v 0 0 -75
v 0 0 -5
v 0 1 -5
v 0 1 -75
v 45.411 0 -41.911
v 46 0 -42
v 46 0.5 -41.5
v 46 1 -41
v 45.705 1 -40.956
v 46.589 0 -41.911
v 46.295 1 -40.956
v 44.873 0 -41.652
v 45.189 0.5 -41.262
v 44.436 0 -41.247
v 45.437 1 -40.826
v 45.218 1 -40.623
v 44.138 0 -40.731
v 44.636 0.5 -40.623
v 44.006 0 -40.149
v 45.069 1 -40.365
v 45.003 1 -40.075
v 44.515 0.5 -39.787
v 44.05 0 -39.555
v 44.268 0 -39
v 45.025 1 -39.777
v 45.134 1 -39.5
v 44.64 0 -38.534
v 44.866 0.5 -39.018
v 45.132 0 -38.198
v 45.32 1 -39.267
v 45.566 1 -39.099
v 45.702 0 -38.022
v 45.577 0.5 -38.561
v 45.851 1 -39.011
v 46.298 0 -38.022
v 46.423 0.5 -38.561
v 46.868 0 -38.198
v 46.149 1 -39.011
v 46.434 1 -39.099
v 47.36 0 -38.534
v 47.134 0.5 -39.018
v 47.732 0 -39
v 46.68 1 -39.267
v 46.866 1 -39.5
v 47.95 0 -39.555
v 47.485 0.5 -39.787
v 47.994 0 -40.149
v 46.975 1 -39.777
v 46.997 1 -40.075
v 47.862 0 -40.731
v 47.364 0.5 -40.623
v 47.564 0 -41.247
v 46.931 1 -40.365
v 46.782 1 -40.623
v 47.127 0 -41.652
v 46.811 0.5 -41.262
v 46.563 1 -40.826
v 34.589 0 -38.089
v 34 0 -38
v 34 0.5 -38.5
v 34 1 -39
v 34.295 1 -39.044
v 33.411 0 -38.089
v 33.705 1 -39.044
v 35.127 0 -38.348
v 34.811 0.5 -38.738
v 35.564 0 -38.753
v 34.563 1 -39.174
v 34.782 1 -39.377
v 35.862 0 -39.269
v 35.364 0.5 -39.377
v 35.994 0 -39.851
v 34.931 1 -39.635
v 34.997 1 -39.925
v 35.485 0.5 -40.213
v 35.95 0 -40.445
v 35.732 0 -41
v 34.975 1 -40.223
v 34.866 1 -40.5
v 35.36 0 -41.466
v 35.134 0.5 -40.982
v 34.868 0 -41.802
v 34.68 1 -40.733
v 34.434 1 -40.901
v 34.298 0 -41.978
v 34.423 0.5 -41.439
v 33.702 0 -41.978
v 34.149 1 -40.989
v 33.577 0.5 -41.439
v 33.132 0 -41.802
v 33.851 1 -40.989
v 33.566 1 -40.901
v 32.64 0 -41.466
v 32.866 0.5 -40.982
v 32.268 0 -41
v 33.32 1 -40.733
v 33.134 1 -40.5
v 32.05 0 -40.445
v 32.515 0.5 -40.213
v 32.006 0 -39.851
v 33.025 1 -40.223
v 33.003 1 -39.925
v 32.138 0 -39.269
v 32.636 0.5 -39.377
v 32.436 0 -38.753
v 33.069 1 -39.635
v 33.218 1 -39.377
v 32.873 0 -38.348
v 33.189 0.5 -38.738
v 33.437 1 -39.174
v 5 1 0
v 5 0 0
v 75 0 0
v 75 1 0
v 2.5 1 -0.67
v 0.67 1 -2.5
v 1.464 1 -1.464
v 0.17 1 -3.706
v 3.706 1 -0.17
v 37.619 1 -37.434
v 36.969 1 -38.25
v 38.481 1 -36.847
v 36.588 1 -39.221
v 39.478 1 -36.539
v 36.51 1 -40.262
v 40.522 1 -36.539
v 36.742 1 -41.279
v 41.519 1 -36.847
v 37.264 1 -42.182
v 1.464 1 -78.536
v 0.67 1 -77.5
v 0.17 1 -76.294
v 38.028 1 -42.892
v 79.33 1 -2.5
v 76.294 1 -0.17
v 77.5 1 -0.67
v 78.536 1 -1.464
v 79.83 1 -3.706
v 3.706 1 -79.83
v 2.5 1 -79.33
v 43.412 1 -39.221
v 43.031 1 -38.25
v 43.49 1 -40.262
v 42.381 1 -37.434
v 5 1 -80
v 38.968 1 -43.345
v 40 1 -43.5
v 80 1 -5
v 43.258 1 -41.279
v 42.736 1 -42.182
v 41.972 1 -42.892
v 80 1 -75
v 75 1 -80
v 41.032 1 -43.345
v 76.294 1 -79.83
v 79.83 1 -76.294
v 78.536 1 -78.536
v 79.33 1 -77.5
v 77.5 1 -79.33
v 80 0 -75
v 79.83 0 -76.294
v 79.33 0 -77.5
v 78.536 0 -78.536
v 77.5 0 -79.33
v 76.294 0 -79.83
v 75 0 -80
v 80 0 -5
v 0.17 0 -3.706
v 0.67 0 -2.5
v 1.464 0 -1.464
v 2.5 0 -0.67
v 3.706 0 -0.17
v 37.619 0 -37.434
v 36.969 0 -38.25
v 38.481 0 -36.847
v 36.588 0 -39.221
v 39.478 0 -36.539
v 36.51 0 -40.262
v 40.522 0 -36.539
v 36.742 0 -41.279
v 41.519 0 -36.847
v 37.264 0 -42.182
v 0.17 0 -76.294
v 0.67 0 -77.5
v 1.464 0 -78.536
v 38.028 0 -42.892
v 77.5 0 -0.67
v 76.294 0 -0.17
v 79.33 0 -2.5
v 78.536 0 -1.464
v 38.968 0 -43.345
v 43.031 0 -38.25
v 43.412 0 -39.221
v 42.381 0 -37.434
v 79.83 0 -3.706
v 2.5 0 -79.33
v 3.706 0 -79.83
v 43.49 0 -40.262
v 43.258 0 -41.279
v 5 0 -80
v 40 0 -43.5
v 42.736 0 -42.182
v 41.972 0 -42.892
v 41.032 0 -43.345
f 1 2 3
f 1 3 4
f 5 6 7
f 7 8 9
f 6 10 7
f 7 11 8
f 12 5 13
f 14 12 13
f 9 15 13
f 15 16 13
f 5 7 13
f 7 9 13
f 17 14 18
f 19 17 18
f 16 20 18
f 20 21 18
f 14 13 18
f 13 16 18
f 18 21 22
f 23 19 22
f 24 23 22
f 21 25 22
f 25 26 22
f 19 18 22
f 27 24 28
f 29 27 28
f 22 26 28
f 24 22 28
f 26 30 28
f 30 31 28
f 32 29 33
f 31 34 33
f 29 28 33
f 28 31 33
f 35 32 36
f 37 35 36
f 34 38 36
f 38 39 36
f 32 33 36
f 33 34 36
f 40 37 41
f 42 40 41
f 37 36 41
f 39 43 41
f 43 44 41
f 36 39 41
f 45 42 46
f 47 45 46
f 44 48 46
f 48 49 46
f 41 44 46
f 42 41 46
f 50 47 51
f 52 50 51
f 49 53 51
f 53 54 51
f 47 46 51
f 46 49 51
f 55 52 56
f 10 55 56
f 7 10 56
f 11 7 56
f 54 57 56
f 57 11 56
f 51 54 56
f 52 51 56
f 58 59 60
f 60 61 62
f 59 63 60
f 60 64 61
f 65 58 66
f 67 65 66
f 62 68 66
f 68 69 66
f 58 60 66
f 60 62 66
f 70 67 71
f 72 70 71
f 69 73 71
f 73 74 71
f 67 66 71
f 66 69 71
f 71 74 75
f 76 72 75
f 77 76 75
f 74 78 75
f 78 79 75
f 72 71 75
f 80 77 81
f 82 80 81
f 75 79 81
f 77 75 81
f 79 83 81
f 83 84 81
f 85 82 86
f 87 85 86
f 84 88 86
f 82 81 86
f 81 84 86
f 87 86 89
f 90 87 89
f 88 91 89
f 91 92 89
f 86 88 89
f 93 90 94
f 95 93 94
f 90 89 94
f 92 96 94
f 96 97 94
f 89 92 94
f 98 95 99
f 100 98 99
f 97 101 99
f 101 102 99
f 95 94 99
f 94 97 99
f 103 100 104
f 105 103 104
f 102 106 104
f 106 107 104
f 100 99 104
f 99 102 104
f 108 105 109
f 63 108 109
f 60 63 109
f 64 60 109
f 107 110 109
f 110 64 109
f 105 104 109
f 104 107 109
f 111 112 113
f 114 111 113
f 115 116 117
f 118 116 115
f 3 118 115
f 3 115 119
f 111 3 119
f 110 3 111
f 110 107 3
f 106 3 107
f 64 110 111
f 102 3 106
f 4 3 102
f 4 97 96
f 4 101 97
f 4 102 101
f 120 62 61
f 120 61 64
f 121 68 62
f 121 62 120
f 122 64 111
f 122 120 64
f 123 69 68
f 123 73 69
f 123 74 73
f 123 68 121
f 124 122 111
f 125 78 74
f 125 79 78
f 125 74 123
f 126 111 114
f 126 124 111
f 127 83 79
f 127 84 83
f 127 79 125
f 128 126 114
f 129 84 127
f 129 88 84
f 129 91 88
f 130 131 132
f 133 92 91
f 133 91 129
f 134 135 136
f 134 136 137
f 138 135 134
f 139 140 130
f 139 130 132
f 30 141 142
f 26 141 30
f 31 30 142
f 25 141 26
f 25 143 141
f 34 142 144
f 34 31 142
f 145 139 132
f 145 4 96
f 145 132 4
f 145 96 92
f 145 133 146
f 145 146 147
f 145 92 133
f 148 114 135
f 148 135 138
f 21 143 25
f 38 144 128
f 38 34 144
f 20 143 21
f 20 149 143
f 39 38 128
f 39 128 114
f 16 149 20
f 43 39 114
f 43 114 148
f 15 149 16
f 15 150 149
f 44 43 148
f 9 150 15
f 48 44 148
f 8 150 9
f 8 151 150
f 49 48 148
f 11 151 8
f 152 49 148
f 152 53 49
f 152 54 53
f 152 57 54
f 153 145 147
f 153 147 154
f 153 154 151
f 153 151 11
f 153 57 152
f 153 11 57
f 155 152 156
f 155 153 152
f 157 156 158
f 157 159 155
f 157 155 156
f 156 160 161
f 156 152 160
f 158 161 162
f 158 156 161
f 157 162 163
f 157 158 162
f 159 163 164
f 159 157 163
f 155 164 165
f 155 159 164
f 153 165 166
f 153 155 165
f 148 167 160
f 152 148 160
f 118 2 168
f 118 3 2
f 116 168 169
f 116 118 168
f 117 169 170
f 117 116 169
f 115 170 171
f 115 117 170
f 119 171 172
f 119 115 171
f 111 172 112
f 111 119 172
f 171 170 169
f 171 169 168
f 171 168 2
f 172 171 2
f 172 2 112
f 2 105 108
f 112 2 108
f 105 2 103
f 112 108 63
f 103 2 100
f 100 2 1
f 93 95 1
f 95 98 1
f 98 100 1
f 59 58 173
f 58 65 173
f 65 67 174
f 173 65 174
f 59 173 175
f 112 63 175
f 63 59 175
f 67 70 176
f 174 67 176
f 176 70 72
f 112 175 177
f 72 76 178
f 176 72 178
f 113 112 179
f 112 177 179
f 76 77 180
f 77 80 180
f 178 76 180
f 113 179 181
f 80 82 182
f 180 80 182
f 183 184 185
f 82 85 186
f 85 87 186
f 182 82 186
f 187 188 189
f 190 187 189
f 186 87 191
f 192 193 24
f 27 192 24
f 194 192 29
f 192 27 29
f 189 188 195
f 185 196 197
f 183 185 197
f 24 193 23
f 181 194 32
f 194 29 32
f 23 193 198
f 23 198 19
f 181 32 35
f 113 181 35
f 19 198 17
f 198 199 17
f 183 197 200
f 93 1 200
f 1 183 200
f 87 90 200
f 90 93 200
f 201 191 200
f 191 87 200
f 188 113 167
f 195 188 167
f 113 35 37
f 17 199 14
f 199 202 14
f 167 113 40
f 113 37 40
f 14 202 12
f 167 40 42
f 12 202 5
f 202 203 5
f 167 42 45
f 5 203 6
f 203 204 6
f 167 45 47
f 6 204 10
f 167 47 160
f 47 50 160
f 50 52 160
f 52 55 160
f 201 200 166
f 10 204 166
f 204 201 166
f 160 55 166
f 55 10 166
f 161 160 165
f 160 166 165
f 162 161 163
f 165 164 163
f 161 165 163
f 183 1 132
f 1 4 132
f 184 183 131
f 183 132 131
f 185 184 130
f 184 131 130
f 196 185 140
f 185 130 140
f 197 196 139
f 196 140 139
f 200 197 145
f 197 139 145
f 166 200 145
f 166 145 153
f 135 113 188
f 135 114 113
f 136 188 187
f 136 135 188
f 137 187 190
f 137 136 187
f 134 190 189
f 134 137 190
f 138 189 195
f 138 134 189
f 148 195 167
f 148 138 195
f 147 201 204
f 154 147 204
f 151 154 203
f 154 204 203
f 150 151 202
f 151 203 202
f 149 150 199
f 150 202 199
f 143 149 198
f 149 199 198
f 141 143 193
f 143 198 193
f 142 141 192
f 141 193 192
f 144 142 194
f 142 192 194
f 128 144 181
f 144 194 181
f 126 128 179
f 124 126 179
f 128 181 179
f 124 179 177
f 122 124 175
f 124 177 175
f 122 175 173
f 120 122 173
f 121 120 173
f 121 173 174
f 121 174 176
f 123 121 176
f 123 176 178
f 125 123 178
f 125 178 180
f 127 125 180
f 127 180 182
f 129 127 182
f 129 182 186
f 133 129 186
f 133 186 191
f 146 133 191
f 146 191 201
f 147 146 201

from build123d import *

# Parameters (mm, degrees)
ESQUISSE1_W                  = 80
ESQUISSE1_H                  = 80
EXTRUSION1_DEPTH             = 1
CONG_1_R                     = 5
ESQUISSE2_R                  = 3.5
ENL_V_MAT_EXTRU_1_DEPTH      = 114.141504321
ESQUISSE3_R                  = 1
ENL_V_MAT_EXTRU_2_DEPTH      = 114.141504321
R_P_TITION_CIRCULAIRE1_COUNT = 2
CHANFREIN1_SIZE              = 1


with BuildPart() as part:
    # Esquisse1 → Extrusion1 (new body)
    with BuildSketch(Plane(origin=(0, 0, 0), x_dir=(1, 0, 0), z_dir=(0, 1, 0))):
        with Locations((40, 40)):
            Rectangle(ESQUISSE1_W, ESQUISSE1_H)
    extrude(amount=EXTRUSION1_DEPTH)

    # Congé1
    cong_1_edges = [part.edges().sort_by_distance(p)[0] for p in [
        (0, 0.5, -80),
        (80, 0.5, -80),
        (80, 0.5, 0),
        (0, 0.5, 0),
    ]]
    fillet(cong_1_edges, radius=CONG_1_R)

    # Esquisse2 → Enlèv. mat.-Extru.1 (cut, through all)
    with BuildSketch(Plane.XZ):
        with Locations(Location((40, -40, 0), (0, 0, 270))):
            Circle(ESQUISSE2_R)
    extrude(amount=-ENL_V_MAT_EXTRU_1_DEPTH, mode=Mode.SUBTRACT)

    # Esquisse3 → Enlèv. mat.-Extru.2 (cut, through all)
    with BuildSketch(Plane(origin=(0, 1, 0), x_dir=(1, 0, 0), z_dir=(0, 1, 0))):
        with Locations(Location((34, 40, 0), (0, 0, 270))):
            Circle(ESQUISSE3_R)
    enl_v_mat_extru_2 = extrude(amount=-ENL_V_MAT_EXTRU_2_DEPTH, mode=Mode.SUBTRACT)

    # Répétition circulaire1: Enlèv. mat.-Extru.2 ×2 about axis
    r_p_tition_circulaire1_axis = Axis((40, 0, -40), (0, 1, 0))
    for i in range(1, R_P_TITION_CIRCULAIRE1_COUNT):
        add(enl_v_mat_extru_2.rotate(r_p_tition_circulaire1_axis, i * 360 / R_P_TITION_CIRCULAIRE1_COUNT), mode=Mode.SUBTRACT)

    # Chanfrein1
    chanfrein1_edges = [part.edges().sort_by_distance(p)[0] for p in [
        (34, 0, -41),
        (46, 0, -39),
    ]]
    chamfer(chanfrein1_edges, length=CHANFREIN1_SIZE - 0.0001)  # a hair under: the kernel refuses the full size


solid = part.part
